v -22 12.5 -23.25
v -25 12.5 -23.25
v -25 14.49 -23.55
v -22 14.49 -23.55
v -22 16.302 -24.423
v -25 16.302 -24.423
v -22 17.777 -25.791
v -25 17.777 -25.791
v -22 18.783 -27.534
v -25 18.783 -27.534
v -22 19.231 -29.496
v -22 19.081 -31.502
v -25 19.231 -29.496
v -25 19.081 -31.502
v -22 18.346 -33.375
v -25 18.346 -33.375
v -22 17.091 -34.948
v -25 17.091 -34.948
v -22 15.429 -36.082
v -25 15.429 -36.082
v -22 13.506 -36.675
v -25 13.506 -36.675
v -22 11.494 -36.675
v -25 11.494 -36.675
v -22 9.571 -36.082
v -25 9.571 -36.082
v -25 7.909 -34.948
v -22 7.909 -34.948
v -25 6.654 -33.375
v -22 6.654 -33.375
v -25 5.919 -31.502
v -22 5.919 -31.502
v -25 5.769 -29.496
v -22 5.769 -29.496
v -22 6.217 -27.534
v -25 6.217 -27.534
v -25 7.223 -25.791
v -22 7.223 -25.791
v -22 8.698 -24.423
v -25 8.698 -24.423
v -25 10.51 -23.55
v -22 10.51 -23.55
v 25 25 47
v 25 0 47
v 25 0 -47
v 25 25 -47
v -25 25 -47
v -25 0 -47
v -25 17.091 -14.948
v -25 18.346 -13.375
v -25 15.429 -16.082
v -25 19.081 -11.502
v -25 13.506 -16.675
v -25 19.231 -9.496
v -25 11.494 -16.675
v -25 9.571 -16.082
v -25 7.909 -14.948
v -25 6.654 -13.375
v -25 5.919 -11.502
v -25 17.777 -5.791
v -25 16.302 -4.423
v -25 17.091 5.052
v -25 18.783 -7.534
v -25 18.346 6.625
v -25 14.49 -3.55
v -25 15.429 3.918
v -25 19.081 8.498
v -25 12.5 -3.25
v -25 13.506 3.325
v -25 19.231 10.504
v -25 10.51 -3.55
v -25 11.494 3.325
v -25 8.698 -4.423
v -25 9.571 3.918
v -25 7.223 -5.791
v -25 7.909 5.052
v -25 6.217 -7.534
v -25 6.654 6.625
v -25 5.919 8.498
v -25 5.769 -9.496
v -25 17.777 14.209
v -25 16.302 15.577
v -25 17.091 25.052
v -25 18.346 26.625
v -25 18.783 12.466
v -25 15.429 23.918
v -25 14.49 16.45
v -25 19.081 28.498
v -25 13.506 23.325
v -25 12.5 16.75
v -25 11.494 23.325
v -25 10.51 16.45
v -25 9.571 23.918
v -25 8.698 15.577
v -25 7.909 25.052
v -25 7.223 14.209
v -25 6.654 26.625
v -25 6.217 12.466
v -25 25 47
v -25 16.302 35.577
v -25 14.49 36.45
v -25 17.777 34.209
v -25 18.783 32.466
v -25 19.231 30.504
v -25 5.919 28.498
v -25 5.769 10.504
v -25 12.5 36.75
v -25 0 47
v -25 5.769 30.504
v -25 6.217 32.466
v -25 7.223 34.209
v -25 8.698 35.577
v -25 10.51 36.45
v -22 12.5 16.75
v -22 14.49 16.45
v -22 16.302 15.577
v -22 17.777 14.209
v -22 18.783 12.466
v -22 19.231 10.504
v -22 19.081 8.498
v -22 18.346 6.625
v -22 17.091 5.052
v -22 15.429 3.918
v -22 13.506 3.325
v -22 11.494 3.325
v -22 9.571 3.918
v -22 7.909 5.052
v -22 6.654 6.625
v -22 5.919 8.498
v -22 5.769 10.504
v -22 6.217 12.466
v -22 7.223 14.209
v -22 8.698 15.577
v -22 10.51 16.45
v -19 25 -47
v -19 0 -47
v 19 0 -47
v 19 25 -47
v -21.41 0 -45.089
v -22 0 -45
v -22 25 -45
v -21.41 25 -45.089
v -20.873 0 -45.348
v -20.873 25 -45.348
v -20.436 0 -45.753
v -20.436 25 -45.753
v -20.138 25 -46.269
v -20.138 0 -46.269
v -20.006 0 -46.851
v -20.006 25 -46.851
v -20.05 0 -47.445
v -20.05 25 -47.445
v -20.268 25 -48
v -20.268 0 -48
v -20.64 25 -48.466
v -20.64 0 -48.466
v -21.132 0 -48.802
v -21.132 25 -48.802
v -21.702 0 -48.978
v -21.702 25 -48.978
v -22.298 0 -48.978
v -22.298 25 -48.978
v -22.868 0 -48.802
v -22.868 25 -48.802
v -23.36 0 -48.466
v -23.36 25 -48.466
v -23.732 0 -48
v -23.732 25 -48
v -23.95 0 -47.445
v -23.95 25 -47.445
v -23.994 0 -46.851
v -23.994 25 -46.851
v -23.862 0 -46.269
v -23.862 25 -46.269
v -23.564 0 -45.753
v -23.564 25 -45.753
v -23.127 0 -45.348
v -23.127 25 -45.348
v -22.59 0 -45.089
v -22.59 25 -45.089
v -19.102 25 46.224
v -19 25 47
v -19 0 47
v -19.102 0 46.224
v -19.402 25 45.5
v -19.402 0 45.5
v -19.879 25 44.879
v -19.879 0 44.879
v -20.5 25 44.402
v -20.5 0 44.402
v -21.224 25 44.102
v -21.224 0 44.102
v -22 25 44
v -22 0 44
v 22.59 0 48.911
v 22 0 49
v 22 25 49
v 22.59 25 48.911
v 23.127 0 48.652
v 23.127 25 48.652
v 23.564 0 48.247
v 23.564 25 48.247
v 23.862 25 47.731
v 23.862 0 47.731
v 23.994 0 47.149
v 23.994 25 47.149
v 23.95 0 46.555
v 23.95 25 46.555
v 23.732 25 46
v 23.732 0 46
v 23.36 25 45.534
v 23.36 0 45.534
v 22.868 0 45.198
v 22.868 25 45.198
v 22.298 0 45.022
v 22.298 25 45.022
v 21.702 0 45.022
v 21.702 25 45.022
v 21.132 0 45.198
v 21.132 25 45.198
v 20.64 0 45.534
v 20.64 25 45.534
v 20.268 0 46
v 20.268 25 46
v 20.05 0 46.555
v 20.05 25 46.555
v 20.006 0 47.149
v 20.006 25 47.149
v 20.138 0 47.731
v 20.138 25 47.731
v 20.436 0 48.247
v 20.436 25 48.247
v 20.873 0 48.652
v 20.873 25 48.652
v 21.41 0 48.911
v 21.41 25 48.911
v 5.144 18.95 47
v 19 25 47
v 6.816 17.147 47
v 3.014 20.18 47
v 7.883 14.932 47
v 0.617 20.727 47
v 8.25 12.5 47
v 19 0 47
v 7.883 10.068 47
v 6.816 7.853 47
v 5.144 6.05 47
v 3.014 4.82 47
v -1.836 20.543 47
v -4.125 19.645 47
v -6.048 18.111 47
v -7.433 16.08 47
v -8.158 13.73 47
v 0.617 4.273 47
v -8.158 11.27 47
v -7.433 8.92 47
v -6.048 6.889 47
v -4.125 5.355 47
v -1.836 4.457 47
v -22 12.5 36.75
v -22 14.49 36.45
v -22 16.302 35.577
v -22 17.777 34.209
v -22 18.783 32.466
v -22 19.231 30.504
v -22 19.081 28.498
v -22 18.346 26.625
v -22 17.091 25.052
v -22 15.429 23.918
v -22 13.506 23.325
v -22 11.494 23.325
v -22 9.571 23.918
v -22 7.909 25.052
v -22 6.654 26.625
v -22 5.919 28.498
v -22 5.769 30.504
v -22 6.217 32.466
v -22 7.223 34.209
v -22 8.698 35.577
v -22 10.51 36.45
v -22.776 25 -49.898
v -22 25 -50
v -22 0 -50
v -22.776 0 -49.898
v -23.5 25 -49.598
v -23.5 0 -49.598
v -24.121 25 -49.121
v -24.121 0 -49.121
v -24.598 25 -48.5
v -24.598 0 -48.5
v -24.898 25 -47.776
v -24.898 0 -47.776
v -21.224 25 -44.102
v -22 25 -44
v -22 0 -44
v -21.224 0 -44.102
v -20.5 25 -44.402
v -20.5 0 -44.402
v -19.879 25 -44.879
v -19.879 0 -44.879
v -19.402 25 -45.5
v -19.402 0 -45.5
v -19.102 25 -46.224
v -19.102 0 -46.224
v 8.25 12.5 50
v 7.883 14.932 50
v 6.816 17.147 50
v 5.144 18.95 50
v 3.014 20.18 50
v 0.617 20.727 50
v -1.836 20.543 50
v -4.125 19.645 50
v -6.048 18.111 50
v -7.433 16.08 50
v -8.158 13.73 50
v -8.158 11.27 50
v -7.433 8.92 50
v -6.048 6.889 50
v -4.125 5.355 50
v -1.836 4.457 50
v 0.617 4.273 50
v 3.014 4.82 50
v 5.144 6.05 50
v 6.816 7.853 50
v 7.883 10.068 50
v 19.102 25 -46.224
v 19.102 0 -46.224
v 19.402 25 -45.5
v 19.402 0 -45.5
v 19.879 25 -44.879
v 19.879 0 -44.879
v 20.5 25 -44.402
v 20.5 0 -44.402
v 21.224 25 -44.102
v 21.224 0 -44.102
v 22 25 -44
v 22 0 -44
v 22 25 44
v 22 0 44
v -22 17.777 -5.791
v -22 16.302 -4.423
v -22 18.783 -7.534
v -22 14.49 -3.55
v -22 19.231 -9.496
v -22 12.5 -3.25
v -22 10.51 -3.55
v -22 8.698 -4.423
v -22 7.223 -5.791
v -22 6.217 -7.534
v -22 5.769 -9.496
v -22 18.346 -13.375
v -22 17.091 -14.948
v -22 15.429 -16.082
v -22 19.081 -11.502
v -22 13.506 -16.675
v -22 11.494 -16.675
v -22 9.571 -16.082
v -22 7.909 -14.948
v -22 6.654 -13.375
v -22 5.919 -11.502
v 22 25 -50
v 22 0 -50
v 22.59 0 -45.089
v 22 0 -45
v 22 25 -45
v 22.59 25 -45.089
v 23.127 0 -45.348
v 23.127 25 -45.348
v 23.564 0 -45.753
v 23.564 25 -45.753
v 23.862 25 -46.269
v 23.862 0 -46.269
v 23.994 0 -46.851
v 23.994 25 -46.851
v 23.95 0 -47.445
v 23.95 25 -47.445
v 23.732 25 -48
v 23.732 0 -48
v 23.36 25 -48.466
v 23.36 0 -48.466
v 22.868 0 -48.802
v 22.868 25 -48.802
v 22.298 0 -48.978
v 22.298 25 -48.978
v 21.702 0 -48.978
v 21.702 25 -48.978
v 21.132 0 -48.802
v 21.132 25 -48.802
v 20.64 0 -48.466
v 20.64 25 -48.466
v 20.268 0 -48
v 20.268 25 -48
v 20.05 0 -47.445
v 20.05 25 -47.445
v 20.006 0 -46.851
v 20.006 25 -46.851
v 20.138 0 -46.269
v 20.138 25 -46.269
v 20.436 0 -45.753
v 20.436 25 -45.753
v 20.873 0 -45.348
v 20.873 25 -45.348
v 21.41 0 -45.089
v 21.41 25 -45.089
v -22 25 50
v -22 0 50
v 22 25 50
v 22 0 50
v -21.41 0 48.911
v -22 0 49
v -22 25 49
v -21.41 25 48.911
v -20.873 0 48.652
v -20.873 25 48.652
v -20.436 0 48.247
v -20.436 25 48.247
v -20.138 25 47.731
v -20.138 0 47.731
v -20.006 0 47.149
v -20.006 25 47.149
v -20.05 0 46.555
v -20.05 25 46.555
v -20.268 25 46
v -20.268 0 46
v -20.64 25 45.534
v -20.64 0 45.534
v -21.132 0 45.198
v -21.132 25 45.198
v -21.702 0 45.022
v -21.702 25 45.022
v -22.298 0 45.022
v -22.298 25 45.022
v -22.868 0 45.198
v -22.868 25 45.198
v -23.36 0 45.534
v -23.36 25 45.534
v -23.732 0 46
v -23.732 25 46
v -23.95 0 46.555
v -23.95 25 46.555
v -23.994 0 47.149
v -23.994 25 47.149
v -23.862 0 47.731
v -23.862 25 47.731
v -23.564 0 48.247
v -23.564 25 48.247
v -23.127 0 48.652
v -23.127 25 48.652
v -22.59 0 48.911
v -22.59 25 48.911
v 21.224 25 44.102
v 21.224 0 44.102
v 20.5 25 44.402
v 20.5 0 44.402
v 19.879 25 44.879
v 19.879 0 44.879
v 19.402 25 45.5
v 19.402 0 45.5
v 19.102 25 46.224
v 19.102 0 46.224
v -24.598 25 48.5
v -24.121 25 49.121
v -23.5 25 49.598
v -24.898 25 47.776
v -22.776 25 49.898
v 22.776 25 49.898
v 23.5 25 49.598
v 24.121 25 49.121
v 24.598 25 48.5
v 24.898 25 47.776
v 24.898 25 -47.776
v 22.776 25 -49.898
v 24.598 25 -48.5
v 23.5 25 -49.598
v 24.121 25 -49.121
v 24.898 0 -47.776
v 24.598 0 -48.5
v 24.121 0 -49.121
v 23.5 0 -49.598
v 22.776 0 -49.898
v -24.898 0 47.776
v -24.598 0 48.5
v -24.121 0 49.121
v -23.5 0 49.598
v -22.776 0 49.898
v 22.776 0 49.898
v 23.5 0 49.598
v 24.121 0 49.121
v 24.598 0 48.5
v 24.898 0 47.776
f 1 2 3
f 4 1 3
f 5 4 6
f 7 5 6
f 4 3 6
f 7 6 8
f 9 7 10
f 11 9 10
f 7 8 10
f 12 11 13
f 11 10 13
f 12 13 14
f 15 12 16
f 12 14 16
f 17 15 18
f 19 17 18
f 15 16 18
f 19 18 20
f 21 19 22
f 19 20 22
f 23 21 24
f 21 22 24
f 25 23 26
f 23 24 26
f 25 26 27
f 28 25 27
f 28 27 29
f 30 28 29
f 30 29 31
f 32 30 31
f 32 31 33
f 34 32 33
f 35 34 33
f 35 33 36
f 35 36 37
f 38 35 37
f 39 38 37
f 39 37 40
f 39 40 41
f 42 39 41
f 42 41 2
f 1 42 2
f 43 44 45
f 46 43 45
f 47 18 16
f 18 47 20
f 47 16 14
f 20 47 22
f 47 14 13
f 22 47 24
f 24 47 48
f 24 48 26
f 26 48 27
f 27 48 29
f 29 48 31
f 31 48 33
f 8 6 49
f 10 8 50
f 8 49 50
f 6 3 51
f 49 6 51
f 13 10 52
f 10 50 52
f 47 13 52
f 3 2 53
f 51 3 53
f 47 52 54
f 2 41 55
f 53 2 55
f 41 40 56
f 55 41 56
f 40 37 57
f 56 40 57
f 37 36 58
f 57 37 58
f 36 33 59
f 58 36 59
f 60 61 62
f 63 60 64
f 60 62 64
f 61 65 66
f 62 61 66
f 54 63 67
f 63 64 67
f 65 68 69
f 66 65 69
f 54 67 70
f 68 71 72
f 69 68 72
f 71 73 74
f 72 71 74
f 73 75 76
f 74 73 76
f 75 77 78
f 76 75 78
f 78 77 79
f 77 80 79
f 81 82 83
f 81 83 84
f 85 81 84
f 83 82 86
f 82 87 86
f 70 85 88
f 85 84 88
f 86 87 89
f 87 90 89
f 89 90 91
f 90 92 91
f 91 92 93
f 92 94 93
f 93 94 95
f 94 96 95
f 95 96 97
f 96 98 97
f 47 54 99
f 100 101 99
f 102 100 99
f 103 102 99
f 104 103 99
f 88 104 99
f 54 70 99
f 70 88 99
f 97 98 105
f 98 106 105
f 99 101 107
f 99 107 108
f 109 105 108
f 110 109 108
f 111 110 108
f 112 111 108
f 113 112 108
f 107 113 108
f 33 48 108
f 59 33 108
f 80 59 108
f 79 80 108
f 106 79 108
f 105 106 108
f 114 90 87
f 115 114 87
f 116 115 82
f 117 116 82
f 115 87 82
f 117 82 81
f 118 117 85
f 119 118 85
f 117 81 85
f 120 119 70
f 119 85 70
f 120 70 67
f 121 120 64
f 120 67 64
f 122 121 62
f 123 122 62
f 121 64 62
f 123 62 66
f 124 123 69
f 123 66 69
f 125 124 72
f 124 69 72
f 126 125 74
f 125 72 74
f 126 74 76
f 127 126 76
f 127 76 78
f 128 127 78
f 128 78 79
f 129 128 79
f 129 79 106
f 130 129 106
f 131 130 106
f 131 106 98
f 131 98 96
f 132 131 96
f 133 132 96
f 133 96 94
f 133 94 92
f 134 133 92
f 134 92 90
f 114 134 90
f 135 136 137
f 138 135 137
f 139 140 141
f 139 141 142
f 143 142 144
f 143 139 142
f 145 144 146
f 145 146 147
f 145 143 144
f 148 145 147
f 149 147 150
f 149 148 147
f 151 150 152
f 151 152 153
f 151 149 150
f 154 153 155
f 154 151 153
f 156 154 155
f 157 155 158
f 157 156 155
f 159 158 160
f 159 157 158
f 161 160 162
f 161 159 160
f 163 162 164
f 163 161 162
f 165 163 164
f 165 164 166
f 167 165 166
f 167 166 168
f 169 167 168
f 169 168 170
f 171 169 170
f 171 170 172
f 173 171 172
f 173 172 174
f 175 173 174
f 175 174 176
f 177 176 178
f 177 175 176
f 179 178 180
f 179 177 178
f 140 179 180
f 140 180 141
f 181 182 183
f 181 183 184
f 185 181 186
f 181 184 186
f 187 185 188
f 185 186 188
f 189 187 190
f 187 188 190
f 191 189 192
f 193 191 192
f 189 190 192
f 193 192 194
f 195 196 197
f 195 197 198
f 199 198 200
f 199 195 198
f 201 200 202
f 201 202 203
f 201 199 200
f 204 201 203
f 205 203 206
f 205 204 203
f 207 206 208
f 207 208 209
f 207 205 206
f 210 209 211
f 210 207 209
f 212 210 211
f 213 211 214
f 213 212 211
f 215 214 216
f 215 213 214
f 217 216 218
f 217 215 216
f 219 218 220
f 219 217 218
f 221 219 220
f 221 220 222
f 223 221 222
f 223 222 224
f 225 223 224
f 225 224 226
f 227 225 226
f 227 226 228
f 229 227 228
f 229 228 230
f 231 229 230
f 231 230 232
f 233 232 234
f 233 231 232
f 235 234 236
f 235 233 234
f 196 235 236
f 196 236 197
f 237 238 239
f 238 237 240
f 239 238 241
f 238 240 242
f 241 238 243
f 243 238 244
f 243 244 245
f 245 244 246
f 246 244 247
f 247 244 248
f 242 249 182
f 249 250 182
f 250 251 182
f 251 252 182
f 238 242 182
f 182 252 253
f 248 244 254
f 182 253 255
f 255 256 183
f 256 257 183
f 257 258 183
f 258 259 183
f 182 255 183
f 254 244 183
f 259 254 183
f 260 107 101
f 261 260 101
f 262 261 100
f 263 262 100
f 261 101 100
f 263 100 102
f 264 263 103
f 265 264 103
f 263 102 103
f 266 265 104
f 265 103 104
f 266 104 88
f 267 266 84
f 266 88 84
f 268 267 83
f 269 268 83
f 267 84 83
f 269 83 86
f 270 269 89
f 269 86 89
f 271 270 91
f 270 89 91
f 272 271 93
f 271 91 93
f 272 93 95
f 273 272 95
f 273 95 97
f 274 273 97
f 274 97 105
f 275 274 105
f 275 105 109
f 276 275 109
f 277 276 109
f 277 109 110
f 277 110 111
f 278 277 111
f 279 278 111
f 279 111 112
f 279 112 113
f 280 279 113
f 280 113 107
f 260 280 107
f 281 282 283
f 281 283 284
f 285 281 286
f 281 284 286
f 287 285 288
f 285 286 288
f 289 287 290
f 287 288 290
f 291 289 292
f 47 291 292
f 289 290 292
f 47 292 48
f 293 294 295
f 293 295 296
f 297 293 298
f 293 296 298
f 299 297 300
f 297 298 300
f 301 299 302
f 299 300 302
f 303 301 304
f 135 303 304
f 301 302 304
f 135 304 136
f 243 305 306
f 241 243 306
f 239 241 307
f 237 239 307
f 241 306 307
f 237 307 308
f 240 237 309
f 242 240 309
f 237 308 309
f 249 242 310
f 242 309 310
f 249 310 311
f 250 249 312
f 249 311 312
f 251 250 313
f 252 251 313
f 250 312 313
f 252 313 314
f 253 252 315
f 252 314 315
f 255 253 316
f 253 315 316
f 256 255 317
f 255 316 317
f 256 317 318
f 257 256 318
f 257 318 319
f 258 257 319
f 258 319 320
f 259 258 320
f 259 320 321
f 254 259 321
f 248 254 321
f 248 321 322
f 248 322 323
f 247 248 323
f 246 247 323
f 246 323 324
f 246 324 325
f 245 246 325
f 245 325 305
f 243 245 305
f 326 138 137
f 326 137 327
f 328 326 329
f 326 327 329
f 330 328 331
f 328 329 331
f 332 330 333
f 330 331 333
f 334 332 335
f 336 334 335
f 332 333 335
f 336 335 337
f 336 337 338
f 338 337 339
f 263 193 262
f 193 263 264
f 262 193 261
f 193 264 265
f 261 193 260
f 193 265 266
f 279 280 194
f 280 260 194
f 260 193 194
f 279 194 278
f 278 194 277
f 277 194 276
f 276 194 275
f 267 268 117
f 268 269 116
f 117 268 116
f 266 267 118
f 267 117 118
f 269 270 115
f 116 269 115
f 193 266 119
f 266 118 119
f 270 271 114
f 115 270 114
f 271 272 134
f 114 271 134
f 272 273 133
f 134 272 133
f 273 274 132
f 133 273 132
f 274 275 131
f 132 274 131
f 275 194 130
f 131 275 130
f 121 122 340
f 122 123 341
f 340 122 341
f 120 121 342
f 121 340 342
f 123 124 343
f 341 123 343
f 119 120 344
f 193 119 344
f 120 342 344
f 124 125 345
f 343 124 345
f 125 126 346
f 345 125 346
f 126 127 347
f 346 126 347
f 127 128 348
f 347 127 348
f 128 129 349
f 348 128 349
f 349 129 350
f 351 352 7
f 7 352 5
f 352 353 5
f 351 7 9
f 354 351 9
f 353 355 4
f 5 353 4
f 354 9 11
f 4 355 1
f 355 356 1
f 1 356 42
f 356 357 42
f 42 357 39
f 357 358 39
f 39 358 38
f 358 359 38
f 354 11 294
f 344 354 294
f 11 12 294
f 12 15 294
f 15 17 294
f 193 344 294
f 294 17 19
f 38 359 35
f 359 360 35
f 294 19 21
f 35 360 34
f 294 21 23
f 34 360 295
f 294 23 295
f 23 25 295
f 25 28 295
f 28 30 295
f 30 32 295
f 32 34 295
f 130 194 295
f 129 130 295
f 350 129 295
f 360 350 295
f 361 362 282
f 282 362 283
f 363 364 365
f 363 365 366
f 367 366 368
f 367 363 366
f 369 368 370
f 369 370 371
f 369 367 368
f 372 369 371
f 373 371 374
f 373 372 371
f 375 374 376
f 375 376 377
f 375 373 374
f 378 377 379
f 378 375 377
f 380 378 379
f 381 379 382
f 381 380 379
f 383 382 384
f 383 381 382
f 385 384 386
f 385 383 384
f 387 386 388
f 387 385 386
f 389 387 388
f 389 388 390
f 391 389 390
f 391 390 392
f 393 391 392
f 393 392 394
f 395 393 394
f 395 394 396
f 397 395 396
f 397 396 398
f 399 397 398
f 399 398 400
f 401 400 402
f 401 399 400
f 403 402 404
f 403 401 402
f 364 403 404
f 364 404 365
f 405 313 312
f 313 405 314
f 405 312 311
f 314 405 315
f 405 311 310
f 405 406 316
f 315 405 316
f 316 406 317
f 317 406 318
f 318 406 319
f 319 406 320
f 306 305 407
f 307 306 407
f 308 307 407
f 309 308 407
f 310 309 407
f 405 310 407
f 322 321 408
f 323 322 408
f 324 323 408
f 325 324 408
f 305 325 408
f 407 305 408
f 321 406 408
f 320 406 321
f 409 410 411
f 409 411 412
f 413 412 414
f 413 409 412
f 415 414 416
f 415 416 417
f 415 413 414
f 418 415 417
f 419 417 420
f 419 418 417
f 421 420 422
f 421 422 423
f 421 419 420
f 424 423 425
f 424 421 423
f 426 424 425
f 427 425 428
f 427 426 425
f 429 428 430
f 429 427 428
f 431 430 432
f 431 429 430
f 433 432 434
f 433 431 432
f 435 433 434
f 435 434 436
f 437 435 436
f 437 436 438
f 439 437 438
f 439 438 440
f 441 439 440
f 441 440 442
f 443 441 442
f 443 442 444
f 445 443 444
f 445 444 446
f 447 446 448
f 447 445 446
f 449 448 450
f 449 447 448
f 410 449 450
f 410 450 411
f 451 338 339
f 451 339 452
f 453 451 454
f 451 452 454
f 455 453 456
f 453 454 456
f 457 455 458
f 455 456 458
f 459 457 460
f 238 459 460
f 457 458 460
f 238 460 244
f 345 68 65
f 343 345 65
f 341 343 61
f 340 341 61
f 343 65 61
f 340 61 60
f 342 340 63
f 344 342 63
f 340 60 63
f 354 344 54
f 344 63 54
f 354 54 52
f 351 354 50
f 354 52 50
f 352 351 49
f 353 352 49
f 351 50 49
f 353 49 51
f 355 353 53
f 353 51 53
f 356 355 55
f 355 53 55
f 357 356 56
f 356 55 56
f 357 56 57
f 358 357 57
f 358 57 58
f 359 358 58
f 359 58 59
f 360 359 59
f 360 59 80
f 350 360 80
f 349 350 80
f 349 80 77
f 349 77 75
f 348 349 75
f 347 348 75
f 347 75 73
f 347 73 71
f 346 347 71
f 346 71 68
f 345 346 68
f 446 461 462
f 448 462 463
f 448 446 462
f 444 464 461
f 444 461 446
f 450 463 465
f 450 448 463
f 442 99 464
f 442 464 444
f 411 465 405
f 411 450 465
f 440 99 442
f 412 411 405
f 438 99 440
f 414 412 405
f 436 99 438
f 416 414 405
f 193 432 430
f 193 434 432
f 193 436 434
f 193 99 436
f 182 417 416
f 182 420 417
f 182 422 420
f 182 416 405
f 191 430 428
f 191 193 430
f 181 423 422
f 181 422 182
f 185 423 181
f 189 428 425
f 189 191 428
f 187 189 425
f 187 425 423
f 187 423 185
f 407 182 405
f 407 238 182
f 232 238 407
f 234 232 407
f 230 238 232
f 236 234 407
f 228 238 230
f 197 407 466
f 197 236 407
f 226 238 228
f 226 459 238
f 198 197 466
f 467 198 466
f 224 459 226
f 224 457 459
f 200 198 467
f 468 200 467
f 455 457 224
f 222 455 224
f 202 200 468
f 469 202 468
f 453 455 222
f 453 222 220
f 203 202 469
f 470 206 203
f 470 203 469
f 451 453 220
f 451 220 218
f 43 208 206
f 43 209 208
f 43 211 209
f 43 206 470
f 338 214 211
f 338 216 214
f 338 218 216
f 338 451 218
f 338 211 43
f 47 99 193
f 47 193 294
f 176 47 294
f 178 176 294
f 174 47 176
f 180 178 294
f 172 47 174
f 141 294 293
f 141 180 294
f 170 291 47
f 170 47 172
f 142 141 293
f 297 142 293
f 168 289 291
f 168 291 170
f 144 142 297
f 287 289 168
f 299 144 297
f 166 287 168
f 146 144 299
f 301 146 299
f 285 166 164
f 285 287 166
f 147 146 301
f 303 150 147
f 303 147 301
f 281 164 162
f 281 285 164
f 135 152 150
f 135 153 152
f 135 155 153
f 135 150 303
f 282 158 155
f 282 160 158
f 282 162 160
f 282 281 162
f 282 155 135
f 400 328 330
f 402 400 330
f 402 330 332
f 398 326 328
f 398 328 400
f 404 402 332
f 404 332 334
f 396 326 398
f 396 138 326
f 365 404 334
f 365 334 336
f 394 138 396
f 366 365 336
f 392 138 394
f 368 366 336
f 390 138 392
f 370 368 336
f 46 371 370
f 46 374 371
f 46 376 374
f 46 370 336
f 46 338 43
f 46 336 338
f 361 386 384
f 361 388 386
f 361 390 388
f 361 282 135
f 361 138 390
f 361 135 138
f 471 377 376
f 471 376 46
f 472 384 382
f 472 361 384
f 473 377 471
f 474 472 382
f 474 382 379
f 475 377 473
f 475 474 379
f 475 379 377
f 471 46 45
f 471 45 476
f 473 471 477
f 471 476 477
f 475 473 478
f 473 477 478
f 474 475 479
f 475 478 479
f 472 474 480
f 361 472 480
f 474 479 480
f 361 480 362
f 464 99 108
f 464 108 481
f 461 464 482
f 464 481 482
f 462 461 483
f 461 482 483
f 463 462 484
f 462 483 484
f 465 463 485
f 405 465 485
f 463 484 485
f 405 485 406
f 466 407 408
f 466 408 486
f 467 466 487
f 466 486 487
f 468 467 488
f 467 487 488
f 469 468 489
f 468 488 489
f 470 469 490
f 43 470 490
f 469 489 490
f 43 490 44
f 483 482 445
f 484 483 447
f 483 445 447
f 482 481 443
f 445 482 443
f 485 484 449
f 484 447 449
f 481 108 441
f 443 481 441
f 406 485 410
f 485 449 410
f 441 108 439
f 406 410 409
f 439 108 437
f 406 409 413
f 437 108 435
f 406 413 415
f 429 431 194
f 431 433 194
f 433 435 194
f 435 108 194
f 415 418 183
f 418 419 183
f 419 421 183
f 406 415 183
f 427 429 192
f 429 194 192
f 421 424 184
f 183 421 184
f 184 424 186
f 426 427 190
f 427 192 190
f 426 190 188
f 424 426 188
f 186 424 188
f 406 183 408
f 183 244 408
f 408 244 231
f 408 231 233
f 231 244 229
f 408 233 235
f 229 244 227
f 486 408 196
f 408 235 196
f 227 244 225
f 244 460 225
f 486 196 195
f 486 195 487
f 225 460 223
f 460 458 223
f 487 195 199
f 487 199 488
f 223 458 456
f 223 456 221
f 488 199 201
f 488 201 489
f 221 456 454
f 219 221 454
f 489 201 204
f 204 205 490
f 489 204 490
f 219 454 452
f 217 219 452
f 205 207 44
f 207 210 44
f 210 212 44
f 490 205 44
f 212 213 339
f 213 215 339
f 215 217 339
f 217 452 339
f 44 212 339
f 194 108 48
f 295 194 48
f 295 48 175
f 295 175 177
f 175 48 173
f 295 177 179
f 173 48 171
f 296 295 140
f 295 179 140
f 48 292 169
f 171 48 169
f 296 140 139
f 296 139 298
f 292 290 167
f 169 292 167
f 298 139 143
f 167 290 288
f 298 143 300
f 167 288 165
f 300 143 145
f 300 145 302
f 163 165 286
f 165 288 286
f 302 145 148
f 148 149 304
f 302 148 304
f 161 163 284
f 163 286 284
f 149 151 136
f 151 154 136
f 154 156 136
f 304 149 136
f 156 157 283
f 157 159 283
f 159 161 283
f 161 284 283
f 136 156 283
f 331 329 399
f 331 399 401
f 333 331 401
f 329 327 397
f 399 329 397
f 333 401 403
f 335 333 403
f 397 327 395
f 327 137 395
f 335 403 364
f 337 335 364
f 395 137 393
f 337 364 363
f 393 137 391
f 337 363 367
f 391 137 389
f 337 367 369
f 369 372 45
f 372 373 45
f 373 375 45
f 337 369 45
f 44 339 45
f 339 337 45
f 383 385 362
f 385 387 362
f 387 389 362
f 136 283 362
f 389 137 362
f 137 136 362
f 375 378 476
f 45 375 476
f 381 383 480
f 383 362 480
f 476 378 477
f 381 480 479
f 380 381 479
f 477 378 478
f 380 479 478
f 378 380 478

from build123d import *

# Parameters (mm, degrees)
SKETCH1_R           = 2
BOSS_EXTRUDE1_DEPTH = 25
CUT_EXTRUDE1_REACH  = 108.066
SKETCH2_R           = 8.25
CUT_EXTRUDE2_REACH  = 77
SKETCH3_R           = 6.75


with BuildPart() as part:
    # Sketch1 → Boss-Extrude1 (new body)
    with BuildSketch(Plane(origin=(0, 0, 0), x_dir=(1, 0, 0), z_dir=(0, 1, 0))):
        with BuildLine():
            ThreePointArc((-22, 50), (-24.121320344, 49.121320344), (-25, 47))
            Line((-25, 47), (-25, -47))
            ThreePointArc((-25, -47), (-24.121320344, -49.121320344), (-22, -50))
            Line((-22, -50), (22, -50))
            ThreePointArc((22, -50), (24.121320344, -49.121320344), (25, -47))
            Line((25, -47), (25, 47))
            ThreePointArc((25, 47), (24.121320344, 49.121320344), (22, 50))
            Line((22, 50), (-22, 50))
        make_face()
        with Locations(Location((-22, -47, 0), (0, 0, 270))):
            Circle(SKETCH1_R, mode=Mode.SUBTRACT)
        with BuildLine():
            Line((-22, -44), (-22, 44))
            ThreePointArc((-22, 44), (-19.878679656, 44.878679656), (-19, 47))
            Line((-19, 47), (19, 47))
            ThreePointArc((19, 47), (19.878679656, 44.878679656), (22, 44))
            Line((22, 44), (22, -44))
            ThreePointArc((22, -44), (19.878679656, -44.878679656), (19, -47))
            Line((19, -47), (-19, -47))
            ThreePointArc((-19, -47), (-19.878679656, -44.878679656), (-22, -44))
        make_face(mode=Mode.SUBTRACT)
        with Locations(Location((22, 47, 0), (0, 0, 270))):
            Circle(SKETCH1_R, mode=Mode.SUBTRACT)
        with Locations(Location((-22, 47, 0), (0, 0, 270))):
            Circle(SKETCH1_R, mode=Mode.SUBTRACT)
        with Locations(Location((22, -47, 0), (0, 0, 270))):
            Circle(SKETCH1_R, mode=Mode.SUBTRACT)
    extrude(amount=BOSS_EXTRUDE1_DEPTH)

    # Sketch2 → Cut-Extrude1 (cut, up to next)
    with BuildSketch(Plane.XY.offset(50), mode=Mode.PRIVATE) as cut_extrude1_sk1:
        with Locations((0, 12.5)):
            Circle(SKETCH2_R)
    cut_extrude1_tool1 = extrude(cut_extrude1_sk1.sketch, amount=-CUT_EXTRUDE1_REACH, mode=Mode.PRIVATE) & part.part
    add(cut_extrude1_tool1.solids().sort_by_distance((0, 12.5, 50))[0], mode=Mode.SUBTRACT)

    # Sketch3 → Cut-Extrude2 (cut, up to next)
    with BuildSketch(Plane.ZY.offset(25), mode=Mode.PRIVATE) as cut_extrude2_sk1:
        with Locations((-30, 12.5)):
            Circle(SKETCH3_R)
    cut_extrude2_tool1 = extrude(cut_extrude2_sk1.sketch, amount=-CUT_EXTRUDE2_REACH, mode=Mode.PRIVATE) & part.part
    # Sketch3 → Cut-Extrude2 (cut, up to next)
    with BuildSketch(Plane.ZY.offset(25), mode=Mode.PRIVATE) as cut_extrude2_sk2:
        with Locations((-10, 12.5)):
            Circle(SKETCH3_R)
    cut_extrude2_tool2 = extrude(cut_extrude2_sk2.sketch, amount=-CUT_EXTRUDE2_REACH, mode=Mode.PRIVATE) & part.part
    # Sketch3 → Cut-Extrude2 (cut, up to next)
    with BuildSketch(Plane.ZY.offset(25), mode=Mode.PRIVATE) as cut_extrude2_sk3:
        with Locations((10, 12.5)):
            Circle(SKETCH3_R)
    cut_extrude2_tool3 = extrude(cut_extrude2_sk3.sketch, amount=-CUT_EXTRUDE2_REACH, mode=Mode.PRIVATE) & part.part
    # Sketch3 → Cut-Extrude2 (cut, up to next)
    with BuildSketch(Plane.ZY.offset(25), mode=Mode.PRIVATE) as cut_extrude2_sk4:
        with Locations((30, 12.5)):
            Circle(SKETCH3_R)
    cut_extrude2_tool4 = extrude(cut_extrude2_sk4.sketch, amount=-CUT_EXTRUDE2_REACH, mode=Mode.PRIVATE) & part.part
    add(cut_extrude2_tool1.solids().sort_by_distance((-25, 12.5, -30))[0], mode=Mode.SUBTRACT)
    add(cut_extrude2_tool2.solids().sort_by_distance((-25, 12.5, -10))[0], mode=Mode.SUBTRACT)
    add(cut_extrude2_tool3.solids().sort_by_distance((-25, 12.5, 10))[0], mode=Mode.SUBTRACT)
    add(cut_extrude2_tool4.solids().sort_by_distance((-25, 12.5, 30))[0], mode=Mode.SUBTRACT)


solid = part.part
